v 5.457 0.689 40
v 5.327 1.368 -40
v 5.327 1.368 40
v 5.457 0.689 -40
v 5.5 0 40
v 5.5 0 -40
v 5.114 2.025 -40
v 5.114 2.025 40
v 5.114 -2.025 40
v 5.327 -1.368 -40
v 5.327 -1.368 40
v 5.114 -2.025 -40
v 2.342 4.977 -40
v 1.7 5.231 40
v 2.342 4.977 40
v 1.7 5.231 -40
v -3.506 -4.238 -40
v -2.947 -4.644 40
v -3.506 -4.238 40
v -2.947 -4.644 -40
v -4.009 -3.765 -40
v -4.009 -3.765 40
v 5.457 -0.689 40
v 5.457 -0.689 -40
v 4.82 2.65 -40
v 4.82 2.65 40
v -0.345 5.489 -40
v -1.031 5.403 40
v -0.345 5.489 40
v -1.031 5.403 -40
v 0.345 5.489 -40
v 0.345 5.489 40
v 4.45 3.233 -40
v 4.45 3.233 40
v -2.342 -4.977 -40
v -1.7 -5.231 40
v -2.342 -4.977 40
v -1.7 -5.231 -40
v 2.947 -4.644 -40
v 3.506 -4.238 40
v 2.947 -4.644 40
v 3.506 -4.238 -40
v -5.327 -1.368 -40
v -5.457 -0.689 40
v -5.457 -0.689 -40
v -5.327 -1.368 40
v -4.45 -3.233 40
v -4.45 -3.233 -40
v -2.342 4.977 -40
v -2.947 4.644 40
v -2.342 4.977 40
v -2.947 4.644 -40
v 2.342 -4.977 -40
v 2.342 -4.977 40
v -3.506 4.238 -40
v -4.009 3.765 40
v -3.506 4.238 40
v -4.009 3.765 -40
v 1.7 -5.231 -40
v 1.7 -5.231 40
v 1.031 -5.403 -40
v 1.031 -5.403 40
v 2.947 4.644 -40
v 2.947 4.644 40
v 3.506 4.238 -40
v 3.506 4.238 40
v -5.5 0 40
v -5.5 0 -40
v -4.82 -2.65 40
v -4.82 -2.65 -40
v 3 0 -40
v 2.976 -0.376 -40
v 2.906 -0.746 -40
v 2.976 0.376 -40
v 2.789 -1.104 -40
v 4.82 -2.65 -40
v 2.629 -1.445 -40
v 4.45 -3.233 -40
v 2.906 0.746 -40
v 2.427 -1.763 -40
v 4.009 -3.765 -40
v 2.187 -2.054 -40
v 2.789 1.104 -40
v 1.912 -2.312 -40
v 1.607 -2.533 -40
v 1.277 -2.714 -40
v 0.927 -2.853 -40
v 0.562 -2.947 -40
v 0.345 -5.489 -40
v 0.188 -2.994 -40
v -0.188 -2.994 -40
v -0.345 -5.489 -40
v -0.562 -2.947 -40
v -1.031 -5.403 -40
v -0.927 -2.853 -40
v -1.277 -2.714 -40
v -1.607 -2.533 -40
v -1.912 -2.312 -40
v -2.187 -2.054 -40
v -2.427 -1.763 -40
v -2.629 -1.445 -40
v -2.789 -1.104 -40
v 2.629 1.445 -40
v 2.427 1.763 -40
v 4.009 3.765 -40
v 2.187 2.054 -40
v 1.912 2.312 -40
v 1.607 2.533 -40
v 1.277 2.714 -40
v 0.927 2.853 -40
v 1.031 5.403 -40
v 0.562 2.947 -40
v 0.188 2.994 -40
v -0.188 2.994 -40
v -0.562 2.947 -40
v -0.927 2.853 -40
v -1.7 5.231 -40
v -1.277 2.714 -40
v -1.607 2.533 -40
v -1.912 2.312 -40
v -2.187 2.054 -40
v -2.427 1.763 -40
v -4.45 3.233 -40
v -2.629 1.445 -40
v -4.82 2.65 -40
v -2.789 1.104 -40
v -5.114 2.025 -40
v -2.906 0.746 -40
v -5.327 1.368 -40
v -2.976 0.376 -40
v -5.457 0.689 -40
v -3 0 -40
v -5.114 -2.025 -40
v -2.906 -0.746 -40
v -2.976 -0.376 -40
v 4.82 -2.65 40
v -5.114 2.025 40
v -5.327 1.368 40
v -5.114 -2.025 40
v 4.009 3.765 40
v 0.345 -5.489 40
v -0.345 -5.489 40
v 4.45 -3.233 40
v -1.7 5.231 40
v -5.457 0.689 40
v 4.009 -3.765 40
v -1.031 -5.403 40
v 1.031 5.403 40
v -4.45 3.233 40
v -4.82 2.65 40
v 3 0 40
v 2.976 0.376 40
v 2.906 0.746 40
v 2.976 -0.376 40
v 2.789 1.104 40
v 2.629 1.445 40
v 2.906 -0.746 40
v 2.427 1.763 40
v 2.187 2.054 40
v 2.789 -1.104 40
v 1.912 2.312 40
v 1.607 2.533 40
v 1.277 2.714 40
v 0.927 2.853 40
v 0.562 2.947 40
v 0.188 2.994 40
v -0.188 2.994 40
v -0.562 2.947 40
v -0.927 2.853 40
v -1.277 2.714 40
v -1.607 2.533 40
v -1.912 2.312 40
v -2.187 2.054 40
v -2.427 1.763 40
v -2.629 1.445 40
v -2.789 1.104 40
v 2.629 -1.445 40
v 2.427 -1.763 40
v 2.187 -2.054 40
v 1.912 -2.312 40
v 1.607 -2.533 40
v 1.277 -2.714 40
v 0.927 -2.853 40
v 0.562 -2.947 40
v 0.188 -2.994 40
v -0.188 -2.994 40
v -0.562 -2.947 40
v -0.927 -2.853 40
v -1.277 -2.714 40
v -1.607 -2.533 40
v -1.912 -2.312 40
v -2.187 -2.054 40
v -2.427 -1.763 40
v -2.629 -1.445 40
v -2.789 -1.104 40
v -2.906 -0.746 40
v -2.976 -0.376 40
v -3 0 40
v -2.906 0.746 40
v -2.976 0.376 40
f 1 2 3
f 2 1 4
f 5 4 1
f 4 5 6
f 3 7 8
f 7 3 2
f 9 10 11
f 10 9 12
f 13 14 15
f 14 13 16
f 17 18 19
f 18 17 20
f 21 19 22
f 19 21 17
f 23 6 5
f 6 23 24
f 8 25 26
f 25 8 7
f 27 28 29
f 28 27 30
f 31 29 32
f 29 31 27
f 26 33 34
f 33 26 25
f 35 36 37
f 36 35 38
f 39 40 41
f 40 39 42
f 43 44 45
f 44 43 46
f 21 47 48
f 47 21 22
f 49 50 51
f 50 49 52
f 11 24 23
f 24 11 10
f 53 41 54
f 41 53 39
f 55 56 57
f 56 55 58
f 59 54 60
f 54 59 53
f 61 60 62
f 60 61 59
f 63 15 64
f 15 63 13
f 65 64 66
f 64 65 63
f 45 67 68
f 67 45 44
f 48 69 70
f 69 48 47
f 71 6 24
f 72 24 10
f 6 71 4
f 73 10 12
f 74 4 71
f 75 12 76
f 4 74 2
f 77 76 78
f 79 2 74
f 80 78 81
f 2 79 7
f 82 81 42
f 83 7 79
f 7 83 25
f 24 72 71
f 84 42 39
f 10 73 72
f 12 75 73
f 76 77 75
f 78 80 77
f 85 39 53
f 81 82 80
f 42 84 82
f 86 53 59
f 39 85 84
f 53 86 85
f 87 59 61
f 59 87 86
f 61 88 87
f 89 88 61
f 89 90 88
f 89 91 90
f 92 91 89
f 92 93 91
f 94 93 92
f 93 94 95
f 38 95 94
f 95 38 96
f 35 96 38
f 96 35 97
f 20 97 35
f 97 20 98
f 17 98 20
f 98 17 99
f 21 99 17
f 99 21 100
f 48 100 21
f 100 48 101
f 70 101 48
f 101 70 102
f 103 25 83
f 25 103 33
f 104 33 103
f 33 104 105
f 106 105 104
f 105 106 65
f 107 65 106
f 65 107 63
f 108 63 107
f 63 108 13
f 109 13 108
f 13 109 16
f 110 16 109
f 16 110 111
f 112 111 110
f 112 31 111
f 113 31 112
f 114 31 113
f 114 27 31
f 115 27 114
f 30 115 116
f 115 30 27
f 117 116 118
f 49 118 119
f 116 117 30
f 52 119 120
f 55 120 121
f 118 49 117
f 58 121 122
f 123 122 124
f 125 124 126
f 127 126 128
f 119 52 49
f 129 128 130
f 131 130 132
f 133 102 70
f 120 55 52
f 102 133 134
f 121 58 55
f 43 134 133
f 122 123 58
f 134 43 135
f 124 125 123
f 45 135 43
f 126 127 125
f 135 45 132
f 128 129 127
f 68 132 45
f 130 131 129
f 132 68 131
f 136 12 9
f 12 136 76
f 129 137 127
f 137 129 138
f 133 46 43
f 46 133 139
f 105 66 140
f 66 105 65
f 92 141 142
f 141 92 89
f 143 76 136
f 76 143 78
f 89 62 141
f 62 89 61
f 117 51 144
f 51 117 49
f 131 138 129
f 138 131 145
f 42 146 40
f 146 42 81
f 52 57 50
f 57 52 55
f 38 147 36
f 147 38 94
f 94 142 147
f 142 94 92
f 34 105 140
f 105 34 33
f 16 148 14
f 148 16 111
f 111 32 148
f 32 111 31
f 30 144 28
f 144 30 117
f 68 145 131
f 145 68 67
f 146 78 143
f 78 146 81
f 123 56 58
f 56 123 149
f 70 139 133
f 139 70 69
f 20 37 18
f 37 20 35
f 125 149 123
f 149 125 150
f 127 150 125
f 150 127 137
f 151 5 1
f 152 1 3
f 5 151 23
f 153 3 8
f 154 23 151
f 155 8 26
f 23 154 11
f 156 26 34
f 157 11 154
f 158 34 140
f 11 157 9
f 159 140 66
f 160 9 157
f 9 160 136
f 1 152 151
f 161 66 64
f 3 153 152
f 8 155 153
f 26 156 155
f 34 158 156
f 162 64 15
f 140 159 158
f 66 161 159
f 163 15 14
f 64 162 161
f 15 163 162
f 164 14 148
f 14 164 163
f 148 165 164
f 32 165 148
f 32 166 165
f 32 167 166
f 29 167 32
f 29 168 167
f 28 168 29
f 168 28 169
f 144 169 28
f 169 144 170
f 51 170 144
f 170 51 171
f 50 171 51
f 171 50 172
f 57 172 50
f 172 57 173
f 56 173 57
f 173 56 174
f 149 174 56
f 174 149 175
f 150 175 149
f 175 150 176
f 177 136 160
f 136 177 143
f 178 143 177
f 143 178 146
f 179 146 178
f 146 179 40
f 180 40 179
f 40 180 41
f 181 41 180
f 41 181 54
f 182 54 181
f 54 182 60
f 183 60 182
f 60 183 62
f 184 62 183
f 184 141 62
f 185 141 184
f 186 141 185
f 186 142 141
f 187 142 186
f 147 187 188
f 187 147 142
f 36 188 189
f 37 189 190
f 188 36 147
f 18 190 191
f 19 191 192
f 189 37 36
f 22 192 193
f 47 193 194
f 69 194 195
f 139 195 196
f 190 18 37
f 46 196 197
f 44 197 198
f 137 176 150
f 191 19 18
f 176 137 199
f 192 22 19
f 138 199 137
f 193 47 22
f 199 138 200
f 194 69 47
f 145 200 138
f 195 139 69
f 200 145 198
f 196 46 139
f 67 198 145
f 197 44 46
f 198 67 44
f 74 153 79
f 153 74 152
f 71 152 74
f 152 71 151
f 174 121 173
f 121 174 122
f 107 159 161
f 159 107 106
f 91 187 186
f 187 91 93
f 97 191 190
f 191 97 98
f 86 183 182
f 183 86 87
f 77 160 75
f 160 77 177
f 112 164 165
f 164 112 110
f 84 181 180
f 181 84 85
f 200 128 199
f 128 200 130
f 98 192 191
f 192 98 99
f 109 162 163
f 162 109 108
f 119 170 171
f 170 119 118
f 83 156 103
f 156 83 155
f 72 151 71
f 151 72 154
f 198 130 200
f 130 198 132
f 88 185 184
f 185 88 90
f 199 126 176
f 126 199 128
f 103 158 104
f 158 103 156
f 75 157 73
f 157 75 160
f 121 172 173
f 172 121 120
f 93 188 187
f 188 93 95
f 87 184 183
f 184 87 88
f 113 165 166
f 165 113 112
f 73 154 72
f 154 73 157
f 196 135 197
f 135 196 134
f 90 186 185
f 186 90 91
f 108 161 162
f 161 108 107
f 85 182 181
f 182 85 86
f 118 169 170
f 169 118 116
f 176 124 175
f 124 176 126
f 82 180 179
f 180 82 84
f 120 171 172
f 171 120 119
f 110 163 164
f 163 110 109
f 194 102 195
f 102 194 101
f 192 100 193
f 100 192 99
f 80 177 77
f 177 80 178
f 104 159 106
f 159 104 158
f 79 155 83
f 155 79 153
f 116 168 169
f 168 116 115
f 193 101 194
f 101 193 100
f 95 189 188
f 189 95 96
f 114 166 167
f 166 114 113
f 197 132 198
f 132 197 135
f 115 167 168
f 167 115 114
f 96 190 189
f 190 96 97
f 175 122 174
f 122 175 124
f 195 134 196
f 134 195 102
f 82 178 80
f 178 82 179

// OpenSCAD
$fn = 50;


difference() {
	union() {
		translate(v = [0, 0, -40.0000000000]) {
			cylinder(h = 80, r = 5.5000000000);
		}
	}
	union() {
		translate(v = [0, 0, -100.0000000000]) {
			cylinder(h = 200, r = 3.0000000000);
		}
	}
}
